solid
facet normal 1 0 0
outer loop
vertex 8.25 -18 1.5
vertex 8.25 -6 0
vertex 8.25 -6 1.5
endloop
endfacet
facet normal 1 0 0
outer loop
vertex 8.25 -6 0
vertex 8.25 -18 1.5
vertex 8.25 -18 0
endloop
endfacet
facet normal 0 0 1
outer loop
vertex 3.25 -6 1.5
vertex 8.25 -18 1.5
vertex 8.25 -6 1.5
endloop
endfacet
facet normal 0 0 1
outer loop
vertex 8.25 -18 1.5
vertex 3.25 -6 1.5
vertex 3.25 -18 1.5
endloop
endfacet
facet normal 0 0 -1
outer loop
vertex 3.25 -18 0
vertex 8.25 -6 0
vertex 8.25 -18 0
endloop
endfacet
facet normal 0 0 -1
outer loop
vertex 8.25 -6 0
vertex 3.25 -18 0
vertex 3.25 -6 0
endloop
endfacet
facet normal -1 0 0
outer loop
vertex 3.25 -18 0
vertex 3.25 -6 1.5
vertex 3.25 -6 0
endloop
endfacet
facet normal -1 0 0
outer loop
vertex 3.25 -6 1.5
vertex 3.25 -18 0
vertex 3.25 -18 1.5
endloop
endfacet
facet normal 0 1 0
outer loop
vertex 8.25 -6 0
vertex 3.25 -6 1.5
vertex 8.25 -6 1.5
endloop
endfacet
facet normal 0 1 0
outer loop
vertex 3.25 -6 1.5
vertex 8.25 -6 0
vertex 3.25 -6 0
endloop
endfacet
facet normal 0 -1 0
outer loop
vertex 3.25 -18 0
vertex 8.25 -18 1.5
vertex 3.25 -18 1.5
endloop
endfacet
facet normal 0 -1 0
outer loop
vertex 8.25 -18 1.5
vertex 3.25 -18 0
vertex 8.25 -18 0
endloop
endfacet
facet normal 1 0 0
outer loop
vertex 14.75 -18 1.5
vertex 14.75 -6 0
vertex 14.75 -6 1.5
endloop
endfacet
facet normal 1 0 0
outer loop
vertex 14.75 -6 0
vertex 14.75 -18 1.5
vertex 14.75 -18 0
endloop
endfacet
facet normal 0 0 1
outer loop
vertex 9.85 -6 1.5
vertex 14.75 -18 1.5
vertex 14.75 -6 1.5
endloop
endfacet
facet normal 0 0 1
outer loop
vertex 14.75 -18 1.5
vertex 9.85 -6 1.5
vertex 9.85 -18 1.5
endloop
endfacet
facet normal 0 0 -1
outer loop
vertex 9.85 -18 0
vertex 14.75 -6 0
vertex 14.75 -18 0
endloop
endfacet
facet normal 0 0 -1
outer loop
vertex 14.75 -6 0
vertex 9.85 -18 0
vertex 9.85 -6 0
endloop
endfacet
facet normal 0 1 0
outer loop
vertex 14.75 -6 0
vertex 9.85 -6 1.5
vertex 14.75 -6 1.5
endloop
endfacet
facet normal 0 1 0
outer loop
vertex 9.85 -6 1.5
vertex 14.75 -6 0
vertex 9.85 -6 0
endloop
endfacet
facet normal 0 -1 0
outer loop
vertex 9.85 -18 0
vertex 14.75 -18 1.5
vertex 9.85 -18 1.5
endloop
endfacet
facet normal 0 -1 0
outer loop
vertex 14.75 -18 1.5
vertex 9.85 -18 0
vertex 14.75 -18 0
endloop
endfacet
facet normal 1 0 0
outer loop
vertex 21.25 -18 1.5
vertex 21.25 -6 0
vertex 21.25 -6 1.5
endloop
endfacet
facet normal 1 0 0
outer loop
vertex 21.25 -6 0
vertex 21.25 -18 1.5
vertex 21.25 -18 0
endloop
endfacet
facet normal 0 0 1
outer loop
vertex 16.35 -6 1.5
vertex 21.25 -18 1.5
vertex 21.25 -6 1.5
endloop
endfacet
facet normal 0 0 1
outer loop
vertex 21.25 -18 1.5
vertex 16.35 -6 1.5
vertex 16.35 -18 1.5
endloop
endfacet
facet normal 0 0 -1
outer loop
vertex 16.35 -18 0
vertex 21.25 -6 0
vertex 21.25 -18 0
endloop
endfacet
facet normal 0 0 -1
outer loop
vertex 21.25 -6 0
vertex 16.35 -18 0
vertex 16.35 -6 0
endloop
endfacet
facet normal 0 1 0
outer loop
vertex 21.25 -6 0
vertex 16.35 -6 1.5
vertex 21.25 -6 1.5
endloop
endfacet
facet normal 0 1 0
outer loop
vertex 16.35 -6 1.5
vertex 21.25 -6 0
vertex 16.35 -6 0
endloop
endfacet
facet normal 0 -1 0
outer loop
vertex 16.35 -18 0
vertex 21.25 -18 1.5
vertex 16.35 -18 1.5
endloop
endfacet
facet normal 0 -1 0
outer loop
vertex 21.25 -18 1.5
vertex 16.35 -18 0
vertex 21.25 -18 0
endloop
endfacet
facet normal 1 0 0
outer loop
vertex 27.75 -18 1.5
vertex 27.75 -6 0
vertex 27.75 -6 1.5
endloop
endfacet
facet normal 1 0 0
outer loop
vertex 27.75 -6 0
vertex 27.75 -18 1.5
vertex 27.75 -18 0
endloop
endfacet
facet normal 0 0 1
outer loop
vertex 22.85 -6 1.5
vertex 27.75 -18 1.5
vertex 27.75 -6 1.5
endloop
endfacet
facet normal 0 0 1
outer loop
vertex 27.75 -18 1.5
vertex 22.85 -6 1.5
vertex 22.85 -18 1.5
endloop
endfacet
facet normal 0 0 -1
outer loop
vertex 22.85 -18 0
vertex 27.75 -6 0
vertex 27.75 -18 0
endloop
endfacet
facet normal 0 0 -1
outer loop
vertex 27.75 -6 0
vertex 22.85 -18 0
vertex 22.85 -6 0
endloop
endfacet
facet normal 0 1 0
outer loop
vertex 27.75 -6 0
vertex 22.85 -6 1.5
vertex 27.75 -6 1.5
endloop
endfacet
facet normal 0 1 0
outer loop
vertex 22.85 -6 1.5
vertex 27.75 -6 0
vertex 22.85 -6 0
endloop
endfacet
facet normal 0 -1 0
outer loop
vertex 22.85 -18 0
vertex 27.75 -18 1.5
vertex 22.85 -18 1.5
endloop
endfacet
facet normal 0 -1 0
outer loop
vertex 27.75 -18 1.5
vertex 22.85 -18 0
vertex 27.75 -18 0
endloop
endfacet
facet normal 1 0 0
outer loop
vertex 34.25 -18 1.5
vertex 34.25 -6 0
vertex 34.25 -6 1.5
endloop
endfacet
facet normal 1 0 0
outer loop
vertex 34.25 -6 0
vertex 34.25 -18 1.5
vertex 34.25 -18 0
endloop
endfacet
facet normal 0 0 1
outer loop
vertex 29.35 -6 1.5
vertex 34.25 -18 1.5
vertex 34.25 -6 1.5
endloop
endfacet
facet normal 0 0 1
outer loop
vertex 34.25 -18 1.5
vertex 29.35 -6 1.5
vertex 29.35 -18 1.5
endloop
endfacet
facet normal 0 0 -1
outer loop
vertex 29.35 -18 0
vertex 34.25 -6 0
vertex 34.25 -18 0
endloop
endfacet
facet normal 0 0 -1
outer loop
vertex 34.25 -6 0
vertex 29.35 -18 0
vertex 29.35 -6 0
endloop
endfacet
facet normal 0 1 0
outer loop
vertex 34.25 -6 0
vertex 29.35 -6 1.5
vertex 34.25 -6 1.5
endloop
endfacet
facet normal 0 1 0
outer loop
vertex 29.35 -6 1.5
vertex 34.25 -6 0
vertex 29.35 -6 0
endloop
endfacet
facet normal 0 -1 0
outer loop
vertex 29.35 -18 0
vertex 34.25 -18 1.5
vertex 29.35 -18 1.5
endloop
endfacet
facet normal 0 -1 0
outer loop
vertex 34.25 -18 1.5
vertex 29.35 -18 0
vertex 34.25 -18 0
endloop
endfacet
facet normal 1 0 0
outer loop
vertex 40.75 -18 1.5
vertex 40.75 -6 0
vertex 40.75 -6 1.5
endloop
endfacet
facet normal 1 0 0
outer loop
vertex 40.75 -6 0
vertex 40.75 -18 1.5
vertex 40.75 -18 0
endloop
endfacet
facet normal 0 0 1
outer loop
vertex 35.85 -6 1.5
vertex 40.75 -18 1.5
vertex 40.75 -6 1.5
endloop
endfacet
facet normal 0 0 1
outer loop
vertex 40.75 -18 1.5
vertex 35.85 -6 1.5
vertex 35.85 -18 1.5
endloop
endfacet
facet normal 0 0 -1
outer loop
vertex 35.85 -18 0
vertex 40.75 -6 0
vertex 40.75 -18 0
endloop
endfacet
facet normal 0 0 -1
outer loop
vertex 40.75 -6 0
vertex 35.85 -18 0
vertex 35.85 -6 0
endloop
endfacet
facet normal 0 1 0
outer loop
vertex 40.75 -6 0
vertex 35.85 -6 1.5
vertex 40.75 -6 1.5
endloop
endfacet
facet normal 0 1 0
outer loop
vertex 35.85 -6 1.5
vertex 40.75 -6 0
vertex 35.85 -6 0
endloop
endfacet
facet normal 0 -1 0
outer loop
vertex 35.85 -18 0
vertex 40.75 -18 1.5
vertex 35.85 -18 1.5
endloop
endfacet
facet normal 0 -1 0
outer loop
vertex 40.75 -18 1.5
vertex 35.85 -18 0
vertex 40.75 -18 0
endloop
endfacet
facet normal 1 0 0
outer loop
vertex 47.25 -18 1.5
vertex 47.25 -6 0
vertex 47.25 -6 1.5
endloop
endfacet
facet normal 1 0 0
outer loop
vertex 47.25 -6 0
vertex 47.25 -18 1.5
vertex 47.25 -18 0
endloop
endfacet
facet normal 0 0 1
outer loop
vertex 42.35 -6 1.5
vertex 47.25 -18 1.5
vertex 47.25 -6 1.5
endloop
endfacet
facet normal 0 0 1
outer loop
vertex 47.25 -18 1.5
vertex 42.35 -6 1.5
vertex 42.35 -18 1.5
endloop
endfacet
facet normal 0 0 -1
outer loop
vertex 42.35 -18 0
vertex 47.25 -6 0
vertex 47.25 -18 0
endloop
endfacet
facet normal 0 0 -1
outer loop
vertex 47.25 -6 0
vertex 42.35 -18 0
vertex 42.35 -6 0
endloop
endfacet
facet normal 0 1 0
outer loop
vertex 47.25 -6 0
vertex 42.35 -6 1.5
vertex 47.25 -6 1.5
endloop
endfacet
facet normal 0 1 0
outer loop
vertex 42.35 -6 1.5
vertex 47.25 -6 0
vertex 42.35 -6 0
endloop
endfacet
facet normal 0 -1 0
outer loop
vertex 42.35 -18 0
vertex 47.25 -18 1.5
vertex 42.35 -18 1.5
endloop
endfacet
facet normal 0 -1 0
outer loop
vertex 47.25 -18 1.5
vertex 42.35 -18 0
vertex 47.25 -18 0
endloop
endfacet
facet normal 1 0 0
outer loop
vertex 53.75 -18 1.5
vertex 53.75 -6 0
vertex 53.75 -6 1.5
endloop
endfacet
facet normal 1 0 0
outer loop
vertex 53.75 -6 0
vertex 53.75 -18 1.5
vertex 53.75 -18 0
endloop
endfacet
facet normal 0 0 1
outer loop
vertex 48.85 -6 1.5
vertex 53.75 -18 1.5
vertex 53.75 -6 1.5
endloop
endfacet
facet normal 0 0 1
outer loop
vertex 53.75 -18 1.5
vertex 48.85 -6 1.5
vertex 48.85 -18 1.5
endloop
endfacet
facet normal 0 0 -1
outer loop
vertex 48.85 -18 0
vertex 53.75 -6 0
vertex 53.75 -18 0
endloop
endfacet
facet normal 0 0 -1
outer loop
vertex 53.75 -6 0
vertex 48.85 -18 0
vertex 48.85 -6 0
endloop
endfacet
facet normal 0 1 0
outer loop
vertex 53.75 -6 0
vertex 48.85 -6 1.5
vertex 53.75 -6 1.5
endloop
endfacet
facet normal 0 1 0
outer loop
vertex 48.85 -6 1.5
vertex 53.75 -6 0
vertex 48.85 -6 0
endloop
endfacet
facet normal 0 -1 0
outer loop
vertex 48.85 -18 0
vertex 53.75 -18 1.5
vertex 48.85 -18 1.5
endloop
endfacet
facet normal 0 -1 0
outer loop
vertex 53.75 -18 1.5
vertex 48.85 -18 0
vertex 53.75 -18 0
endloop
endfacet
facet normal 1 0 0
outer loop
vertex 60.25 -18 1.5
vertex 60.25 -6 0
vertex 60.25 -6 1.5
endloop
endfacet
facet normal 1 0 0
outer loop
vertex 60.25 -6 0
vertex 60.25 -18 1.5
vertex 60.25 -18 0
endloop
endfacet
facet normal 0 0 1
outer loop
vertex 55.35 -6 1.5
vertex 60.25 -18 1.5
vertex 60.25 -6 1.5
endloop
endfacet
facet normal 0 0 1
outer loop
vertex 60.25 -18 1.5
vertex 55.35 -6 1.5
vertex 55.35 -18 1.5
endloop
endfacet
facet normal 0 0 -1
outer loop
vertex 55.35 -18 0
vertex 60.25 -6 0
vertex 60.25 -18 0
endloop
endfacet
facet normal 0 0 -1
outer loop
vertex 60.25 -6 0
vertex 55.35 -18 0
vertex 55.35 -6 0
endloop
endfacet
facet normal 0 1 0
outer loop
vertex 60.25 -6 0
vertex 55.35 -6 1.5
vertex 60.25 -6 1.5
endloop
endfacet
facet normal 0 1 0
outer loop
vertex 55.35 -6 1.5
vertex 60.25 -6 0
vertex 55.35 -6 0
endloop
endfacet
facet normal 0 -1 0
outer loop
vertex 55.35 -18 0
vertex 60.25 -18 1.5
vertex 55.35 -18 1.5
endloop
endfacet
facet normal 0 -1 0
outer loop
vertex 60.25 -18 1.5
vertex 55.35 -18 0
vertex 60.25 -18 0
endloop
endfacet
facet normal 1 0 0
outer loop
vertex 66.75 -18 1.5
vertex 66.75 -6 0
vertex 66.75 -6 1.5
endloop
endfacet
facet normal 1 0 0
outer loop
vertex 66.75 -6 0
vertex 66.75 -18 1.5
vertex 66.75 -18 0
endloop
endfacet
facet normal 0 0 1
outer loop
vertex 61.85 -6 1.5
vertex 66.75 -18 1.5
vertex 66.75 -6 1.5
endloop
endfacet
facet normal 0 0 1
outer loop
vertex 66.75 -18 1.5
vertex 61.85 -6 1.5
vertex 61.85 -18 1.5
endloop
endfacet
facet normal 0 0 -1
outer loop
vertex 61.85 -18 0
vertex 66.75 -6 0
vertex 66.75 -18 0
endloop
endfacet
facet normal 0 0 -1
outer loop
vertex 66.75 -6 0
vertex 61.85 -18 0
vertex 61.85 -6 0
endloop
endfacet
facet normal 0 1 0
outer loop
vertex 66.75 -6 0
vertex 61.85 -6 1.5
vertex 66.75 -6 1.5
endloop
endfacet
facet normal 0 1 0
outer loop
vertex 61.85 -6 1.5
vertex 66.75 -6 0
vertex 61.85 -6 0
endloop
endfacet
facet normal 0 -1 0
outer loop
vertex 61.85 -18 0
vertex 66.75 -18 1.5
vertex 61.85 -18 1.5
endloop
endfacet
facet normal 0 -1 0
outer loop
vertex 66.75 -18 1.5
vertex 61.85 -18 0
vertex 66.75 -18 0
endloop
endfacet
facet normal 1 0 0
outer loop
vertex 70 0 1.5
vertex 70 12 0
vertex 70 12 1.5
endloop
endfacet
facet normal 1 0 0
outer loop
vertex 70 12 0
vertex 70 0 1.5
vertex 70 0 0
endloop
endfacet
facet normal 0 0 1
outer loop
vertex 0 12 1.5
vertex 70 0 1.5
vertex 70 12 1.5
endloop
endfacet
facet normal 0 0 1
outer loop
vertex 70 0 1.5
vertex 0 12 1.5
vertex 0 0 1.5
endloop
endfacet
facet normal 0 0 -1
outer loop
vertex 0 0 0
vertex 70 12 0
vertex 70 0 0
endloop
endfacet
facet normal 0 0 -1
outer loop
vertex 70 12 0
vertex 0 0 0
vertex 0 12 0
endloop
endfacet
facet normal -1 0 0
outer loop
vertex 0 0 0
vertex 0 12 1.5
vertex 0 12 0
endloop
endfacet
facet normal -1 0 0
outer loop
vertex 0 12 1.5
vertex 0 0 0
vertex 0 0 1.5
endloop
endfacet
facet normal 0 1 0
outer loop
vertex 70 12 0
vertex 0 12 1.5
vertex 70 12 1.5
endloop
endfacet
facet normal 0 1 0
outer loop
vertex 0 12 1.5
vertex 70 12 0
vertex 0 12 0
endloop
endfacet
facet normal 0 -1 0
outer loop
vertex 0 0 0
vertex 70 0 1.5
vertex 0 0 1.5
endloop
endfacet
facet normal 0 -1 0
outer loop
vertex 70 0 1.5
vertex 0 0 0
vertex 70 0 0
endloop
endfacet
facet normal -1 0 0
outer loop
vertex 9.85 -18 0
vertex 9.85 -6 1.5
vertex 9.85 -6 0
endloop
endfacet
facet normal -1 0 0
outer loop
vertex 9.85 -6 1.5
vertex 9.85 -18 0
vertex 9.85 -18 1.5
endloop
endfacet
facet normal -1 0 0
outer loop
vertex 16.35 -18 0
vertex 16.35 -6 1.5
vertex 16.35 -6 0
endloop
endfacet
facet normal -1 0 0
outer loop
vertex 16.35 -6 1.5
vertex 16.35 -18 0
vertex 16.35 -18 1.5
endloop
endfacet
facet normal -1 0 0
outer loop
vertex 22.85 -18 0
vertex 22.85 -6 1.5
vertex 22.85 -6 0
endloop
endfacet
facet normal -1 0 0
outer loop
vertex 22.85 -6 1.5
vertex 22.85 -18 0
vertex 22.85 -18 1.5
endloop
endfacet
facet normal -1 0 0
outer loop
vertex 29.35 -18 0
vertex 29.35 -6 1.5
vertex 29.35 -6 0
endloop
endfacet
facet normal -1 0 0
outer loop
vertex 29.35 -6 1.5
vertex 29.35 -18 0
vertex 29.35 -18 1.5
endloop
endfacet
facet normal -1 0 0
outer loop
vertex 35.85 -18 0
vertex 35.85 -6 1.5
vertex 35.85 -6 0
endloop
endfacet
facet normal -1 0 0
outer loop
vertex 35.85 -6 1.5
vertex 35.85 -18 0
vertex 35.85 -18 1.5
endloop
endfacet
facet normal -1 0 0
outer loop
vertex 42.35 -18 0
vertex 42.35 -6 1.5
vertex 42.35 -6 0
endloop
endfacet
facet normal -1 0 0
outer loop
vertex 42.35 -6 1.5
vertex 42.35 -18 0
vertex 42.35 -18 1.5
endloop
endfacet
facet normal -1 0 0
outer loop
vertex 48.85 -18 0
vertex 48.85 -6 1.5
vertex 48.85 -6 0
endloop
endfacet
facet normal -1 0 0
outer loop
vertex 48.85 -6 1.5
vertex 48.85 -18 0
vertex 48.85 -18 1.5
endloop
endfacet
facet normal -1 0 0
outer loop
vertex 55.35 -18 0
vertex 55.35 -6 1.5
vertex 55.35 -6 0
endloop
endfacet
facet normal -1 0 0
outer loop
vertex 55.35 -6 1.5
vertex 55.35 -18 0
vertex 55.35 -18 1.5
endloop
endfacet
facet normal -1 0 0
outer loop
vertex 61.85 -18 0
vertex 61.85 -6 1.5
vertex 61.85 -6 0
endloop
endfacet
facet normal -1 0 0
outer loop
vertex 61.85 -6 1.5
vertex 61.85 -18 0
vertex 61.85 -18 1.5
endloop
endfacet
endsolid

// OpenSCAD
// 10-well Agarose Gel Comb
// Designed for FDM printing, lying flat on the XY plane (Z=0).
// Dimensions in millimetres.

// --- Dimensions ---
$fn = 128; // High resolution for smooth edges

// Spine dimensions
SPINE_LENGTH = 70;   // X dimension
SPINE_WIDTH = 12;    // Y dimension
SPINE_THICKNESS = 1.5; // Z dimension

// Tooth dimensions
TOOTH_WIDTH = 5.0;   // X dimension
TOOTH_LENGTH = 12;   // Y dimension (extends from spine edge)
TOOTH_COUNT = 10;
TOOTH_GAP = 1.5;     // Gap between teeth

// --- Calculations ---
// Total width of the tooth row
TOOTH_ROW_WIDTH = (TOOTH_COUNT * TOOTH_WIDTH) + ((TOOTH_COUNT - 1) * TOOTH_GAP);

// Offset to center the tooth row on the spine in X
X_OFFSET = (SPINE_LENGTH - TOOTH_ROW_WIDTH) / 2;

// Position of the spine edge from which teeth hang (-Y direction)
// Spine is centered in Y (from -SPINE_WIDTH/2 to +SPINE_WIDTH/2)
// So the bottom edge is at -SPINE_WIDTH/2
SPINE_EDGE_Y = -SPINE_WIDTH / 2;

// --- Main Construction ---
// We create the full solid (Spine + Teeth) and then subtract the gaps.
// This ensures a single connected body.

difference() {
    // 1. Create the full solid block containing Spine and Teeth
    union() {
        // Spine
        translate([0, 0, 0])
            cube([SPINE_LENGTH, SPINE_WIDTH, SPINE_THICKNESS]);

        // Teeth
        for (i = [0 : TOOTH_COUNT - 1]) {
            // Calculate X position for this tooth
            current_x = X_OFFSET + (i * (TOOTH_WIDTH + TOOTH_GAP));
            
            // Calculate Y position for this tooth
            // Starts at the spine edge (SPINE_EDGE_Y) and extends in -Y direction
            current_y = SPINE_EDGE_Y - TOOTH_LENGTH;
            
            translate([current_x, current_y, 0])
                cube([TOOTH_WIDTH, TOOTH_LENGTH, SPINE_THICKNESS]);
        }
    }
    
    // 2. Subtract the gaps between teeth
    // We loop through the gaps (0 to TOOTH_COUNT - 2)
    for (i = [0 : TOOTH_COUNT - 2]) {
        // Calculate X position of the gap
        // Start of gap is after tooth i
        gap_x = X_OFFSET + (i * (TOOTH_WIDTH + TOOTH_GAP)) + TOOTH_WIDTH;
        
        // Gap dimensions
        gap_width = TOOTH_GAP;
        gap_length = TOOTH_LENGTH;
        
        // Cut slightly past the faces to ensure clean separation and no thin walls
        // Extending 0.1mm ensures the cut goes through the entire thickness
        translate([gap_x, SPINE_EDGE_Y - TOOTH_LENGTH, 0])
            cube([gap_width + 0.1, gap_length + 0.1, SPINE_THICKNESS + 0.1]);
    }
}
